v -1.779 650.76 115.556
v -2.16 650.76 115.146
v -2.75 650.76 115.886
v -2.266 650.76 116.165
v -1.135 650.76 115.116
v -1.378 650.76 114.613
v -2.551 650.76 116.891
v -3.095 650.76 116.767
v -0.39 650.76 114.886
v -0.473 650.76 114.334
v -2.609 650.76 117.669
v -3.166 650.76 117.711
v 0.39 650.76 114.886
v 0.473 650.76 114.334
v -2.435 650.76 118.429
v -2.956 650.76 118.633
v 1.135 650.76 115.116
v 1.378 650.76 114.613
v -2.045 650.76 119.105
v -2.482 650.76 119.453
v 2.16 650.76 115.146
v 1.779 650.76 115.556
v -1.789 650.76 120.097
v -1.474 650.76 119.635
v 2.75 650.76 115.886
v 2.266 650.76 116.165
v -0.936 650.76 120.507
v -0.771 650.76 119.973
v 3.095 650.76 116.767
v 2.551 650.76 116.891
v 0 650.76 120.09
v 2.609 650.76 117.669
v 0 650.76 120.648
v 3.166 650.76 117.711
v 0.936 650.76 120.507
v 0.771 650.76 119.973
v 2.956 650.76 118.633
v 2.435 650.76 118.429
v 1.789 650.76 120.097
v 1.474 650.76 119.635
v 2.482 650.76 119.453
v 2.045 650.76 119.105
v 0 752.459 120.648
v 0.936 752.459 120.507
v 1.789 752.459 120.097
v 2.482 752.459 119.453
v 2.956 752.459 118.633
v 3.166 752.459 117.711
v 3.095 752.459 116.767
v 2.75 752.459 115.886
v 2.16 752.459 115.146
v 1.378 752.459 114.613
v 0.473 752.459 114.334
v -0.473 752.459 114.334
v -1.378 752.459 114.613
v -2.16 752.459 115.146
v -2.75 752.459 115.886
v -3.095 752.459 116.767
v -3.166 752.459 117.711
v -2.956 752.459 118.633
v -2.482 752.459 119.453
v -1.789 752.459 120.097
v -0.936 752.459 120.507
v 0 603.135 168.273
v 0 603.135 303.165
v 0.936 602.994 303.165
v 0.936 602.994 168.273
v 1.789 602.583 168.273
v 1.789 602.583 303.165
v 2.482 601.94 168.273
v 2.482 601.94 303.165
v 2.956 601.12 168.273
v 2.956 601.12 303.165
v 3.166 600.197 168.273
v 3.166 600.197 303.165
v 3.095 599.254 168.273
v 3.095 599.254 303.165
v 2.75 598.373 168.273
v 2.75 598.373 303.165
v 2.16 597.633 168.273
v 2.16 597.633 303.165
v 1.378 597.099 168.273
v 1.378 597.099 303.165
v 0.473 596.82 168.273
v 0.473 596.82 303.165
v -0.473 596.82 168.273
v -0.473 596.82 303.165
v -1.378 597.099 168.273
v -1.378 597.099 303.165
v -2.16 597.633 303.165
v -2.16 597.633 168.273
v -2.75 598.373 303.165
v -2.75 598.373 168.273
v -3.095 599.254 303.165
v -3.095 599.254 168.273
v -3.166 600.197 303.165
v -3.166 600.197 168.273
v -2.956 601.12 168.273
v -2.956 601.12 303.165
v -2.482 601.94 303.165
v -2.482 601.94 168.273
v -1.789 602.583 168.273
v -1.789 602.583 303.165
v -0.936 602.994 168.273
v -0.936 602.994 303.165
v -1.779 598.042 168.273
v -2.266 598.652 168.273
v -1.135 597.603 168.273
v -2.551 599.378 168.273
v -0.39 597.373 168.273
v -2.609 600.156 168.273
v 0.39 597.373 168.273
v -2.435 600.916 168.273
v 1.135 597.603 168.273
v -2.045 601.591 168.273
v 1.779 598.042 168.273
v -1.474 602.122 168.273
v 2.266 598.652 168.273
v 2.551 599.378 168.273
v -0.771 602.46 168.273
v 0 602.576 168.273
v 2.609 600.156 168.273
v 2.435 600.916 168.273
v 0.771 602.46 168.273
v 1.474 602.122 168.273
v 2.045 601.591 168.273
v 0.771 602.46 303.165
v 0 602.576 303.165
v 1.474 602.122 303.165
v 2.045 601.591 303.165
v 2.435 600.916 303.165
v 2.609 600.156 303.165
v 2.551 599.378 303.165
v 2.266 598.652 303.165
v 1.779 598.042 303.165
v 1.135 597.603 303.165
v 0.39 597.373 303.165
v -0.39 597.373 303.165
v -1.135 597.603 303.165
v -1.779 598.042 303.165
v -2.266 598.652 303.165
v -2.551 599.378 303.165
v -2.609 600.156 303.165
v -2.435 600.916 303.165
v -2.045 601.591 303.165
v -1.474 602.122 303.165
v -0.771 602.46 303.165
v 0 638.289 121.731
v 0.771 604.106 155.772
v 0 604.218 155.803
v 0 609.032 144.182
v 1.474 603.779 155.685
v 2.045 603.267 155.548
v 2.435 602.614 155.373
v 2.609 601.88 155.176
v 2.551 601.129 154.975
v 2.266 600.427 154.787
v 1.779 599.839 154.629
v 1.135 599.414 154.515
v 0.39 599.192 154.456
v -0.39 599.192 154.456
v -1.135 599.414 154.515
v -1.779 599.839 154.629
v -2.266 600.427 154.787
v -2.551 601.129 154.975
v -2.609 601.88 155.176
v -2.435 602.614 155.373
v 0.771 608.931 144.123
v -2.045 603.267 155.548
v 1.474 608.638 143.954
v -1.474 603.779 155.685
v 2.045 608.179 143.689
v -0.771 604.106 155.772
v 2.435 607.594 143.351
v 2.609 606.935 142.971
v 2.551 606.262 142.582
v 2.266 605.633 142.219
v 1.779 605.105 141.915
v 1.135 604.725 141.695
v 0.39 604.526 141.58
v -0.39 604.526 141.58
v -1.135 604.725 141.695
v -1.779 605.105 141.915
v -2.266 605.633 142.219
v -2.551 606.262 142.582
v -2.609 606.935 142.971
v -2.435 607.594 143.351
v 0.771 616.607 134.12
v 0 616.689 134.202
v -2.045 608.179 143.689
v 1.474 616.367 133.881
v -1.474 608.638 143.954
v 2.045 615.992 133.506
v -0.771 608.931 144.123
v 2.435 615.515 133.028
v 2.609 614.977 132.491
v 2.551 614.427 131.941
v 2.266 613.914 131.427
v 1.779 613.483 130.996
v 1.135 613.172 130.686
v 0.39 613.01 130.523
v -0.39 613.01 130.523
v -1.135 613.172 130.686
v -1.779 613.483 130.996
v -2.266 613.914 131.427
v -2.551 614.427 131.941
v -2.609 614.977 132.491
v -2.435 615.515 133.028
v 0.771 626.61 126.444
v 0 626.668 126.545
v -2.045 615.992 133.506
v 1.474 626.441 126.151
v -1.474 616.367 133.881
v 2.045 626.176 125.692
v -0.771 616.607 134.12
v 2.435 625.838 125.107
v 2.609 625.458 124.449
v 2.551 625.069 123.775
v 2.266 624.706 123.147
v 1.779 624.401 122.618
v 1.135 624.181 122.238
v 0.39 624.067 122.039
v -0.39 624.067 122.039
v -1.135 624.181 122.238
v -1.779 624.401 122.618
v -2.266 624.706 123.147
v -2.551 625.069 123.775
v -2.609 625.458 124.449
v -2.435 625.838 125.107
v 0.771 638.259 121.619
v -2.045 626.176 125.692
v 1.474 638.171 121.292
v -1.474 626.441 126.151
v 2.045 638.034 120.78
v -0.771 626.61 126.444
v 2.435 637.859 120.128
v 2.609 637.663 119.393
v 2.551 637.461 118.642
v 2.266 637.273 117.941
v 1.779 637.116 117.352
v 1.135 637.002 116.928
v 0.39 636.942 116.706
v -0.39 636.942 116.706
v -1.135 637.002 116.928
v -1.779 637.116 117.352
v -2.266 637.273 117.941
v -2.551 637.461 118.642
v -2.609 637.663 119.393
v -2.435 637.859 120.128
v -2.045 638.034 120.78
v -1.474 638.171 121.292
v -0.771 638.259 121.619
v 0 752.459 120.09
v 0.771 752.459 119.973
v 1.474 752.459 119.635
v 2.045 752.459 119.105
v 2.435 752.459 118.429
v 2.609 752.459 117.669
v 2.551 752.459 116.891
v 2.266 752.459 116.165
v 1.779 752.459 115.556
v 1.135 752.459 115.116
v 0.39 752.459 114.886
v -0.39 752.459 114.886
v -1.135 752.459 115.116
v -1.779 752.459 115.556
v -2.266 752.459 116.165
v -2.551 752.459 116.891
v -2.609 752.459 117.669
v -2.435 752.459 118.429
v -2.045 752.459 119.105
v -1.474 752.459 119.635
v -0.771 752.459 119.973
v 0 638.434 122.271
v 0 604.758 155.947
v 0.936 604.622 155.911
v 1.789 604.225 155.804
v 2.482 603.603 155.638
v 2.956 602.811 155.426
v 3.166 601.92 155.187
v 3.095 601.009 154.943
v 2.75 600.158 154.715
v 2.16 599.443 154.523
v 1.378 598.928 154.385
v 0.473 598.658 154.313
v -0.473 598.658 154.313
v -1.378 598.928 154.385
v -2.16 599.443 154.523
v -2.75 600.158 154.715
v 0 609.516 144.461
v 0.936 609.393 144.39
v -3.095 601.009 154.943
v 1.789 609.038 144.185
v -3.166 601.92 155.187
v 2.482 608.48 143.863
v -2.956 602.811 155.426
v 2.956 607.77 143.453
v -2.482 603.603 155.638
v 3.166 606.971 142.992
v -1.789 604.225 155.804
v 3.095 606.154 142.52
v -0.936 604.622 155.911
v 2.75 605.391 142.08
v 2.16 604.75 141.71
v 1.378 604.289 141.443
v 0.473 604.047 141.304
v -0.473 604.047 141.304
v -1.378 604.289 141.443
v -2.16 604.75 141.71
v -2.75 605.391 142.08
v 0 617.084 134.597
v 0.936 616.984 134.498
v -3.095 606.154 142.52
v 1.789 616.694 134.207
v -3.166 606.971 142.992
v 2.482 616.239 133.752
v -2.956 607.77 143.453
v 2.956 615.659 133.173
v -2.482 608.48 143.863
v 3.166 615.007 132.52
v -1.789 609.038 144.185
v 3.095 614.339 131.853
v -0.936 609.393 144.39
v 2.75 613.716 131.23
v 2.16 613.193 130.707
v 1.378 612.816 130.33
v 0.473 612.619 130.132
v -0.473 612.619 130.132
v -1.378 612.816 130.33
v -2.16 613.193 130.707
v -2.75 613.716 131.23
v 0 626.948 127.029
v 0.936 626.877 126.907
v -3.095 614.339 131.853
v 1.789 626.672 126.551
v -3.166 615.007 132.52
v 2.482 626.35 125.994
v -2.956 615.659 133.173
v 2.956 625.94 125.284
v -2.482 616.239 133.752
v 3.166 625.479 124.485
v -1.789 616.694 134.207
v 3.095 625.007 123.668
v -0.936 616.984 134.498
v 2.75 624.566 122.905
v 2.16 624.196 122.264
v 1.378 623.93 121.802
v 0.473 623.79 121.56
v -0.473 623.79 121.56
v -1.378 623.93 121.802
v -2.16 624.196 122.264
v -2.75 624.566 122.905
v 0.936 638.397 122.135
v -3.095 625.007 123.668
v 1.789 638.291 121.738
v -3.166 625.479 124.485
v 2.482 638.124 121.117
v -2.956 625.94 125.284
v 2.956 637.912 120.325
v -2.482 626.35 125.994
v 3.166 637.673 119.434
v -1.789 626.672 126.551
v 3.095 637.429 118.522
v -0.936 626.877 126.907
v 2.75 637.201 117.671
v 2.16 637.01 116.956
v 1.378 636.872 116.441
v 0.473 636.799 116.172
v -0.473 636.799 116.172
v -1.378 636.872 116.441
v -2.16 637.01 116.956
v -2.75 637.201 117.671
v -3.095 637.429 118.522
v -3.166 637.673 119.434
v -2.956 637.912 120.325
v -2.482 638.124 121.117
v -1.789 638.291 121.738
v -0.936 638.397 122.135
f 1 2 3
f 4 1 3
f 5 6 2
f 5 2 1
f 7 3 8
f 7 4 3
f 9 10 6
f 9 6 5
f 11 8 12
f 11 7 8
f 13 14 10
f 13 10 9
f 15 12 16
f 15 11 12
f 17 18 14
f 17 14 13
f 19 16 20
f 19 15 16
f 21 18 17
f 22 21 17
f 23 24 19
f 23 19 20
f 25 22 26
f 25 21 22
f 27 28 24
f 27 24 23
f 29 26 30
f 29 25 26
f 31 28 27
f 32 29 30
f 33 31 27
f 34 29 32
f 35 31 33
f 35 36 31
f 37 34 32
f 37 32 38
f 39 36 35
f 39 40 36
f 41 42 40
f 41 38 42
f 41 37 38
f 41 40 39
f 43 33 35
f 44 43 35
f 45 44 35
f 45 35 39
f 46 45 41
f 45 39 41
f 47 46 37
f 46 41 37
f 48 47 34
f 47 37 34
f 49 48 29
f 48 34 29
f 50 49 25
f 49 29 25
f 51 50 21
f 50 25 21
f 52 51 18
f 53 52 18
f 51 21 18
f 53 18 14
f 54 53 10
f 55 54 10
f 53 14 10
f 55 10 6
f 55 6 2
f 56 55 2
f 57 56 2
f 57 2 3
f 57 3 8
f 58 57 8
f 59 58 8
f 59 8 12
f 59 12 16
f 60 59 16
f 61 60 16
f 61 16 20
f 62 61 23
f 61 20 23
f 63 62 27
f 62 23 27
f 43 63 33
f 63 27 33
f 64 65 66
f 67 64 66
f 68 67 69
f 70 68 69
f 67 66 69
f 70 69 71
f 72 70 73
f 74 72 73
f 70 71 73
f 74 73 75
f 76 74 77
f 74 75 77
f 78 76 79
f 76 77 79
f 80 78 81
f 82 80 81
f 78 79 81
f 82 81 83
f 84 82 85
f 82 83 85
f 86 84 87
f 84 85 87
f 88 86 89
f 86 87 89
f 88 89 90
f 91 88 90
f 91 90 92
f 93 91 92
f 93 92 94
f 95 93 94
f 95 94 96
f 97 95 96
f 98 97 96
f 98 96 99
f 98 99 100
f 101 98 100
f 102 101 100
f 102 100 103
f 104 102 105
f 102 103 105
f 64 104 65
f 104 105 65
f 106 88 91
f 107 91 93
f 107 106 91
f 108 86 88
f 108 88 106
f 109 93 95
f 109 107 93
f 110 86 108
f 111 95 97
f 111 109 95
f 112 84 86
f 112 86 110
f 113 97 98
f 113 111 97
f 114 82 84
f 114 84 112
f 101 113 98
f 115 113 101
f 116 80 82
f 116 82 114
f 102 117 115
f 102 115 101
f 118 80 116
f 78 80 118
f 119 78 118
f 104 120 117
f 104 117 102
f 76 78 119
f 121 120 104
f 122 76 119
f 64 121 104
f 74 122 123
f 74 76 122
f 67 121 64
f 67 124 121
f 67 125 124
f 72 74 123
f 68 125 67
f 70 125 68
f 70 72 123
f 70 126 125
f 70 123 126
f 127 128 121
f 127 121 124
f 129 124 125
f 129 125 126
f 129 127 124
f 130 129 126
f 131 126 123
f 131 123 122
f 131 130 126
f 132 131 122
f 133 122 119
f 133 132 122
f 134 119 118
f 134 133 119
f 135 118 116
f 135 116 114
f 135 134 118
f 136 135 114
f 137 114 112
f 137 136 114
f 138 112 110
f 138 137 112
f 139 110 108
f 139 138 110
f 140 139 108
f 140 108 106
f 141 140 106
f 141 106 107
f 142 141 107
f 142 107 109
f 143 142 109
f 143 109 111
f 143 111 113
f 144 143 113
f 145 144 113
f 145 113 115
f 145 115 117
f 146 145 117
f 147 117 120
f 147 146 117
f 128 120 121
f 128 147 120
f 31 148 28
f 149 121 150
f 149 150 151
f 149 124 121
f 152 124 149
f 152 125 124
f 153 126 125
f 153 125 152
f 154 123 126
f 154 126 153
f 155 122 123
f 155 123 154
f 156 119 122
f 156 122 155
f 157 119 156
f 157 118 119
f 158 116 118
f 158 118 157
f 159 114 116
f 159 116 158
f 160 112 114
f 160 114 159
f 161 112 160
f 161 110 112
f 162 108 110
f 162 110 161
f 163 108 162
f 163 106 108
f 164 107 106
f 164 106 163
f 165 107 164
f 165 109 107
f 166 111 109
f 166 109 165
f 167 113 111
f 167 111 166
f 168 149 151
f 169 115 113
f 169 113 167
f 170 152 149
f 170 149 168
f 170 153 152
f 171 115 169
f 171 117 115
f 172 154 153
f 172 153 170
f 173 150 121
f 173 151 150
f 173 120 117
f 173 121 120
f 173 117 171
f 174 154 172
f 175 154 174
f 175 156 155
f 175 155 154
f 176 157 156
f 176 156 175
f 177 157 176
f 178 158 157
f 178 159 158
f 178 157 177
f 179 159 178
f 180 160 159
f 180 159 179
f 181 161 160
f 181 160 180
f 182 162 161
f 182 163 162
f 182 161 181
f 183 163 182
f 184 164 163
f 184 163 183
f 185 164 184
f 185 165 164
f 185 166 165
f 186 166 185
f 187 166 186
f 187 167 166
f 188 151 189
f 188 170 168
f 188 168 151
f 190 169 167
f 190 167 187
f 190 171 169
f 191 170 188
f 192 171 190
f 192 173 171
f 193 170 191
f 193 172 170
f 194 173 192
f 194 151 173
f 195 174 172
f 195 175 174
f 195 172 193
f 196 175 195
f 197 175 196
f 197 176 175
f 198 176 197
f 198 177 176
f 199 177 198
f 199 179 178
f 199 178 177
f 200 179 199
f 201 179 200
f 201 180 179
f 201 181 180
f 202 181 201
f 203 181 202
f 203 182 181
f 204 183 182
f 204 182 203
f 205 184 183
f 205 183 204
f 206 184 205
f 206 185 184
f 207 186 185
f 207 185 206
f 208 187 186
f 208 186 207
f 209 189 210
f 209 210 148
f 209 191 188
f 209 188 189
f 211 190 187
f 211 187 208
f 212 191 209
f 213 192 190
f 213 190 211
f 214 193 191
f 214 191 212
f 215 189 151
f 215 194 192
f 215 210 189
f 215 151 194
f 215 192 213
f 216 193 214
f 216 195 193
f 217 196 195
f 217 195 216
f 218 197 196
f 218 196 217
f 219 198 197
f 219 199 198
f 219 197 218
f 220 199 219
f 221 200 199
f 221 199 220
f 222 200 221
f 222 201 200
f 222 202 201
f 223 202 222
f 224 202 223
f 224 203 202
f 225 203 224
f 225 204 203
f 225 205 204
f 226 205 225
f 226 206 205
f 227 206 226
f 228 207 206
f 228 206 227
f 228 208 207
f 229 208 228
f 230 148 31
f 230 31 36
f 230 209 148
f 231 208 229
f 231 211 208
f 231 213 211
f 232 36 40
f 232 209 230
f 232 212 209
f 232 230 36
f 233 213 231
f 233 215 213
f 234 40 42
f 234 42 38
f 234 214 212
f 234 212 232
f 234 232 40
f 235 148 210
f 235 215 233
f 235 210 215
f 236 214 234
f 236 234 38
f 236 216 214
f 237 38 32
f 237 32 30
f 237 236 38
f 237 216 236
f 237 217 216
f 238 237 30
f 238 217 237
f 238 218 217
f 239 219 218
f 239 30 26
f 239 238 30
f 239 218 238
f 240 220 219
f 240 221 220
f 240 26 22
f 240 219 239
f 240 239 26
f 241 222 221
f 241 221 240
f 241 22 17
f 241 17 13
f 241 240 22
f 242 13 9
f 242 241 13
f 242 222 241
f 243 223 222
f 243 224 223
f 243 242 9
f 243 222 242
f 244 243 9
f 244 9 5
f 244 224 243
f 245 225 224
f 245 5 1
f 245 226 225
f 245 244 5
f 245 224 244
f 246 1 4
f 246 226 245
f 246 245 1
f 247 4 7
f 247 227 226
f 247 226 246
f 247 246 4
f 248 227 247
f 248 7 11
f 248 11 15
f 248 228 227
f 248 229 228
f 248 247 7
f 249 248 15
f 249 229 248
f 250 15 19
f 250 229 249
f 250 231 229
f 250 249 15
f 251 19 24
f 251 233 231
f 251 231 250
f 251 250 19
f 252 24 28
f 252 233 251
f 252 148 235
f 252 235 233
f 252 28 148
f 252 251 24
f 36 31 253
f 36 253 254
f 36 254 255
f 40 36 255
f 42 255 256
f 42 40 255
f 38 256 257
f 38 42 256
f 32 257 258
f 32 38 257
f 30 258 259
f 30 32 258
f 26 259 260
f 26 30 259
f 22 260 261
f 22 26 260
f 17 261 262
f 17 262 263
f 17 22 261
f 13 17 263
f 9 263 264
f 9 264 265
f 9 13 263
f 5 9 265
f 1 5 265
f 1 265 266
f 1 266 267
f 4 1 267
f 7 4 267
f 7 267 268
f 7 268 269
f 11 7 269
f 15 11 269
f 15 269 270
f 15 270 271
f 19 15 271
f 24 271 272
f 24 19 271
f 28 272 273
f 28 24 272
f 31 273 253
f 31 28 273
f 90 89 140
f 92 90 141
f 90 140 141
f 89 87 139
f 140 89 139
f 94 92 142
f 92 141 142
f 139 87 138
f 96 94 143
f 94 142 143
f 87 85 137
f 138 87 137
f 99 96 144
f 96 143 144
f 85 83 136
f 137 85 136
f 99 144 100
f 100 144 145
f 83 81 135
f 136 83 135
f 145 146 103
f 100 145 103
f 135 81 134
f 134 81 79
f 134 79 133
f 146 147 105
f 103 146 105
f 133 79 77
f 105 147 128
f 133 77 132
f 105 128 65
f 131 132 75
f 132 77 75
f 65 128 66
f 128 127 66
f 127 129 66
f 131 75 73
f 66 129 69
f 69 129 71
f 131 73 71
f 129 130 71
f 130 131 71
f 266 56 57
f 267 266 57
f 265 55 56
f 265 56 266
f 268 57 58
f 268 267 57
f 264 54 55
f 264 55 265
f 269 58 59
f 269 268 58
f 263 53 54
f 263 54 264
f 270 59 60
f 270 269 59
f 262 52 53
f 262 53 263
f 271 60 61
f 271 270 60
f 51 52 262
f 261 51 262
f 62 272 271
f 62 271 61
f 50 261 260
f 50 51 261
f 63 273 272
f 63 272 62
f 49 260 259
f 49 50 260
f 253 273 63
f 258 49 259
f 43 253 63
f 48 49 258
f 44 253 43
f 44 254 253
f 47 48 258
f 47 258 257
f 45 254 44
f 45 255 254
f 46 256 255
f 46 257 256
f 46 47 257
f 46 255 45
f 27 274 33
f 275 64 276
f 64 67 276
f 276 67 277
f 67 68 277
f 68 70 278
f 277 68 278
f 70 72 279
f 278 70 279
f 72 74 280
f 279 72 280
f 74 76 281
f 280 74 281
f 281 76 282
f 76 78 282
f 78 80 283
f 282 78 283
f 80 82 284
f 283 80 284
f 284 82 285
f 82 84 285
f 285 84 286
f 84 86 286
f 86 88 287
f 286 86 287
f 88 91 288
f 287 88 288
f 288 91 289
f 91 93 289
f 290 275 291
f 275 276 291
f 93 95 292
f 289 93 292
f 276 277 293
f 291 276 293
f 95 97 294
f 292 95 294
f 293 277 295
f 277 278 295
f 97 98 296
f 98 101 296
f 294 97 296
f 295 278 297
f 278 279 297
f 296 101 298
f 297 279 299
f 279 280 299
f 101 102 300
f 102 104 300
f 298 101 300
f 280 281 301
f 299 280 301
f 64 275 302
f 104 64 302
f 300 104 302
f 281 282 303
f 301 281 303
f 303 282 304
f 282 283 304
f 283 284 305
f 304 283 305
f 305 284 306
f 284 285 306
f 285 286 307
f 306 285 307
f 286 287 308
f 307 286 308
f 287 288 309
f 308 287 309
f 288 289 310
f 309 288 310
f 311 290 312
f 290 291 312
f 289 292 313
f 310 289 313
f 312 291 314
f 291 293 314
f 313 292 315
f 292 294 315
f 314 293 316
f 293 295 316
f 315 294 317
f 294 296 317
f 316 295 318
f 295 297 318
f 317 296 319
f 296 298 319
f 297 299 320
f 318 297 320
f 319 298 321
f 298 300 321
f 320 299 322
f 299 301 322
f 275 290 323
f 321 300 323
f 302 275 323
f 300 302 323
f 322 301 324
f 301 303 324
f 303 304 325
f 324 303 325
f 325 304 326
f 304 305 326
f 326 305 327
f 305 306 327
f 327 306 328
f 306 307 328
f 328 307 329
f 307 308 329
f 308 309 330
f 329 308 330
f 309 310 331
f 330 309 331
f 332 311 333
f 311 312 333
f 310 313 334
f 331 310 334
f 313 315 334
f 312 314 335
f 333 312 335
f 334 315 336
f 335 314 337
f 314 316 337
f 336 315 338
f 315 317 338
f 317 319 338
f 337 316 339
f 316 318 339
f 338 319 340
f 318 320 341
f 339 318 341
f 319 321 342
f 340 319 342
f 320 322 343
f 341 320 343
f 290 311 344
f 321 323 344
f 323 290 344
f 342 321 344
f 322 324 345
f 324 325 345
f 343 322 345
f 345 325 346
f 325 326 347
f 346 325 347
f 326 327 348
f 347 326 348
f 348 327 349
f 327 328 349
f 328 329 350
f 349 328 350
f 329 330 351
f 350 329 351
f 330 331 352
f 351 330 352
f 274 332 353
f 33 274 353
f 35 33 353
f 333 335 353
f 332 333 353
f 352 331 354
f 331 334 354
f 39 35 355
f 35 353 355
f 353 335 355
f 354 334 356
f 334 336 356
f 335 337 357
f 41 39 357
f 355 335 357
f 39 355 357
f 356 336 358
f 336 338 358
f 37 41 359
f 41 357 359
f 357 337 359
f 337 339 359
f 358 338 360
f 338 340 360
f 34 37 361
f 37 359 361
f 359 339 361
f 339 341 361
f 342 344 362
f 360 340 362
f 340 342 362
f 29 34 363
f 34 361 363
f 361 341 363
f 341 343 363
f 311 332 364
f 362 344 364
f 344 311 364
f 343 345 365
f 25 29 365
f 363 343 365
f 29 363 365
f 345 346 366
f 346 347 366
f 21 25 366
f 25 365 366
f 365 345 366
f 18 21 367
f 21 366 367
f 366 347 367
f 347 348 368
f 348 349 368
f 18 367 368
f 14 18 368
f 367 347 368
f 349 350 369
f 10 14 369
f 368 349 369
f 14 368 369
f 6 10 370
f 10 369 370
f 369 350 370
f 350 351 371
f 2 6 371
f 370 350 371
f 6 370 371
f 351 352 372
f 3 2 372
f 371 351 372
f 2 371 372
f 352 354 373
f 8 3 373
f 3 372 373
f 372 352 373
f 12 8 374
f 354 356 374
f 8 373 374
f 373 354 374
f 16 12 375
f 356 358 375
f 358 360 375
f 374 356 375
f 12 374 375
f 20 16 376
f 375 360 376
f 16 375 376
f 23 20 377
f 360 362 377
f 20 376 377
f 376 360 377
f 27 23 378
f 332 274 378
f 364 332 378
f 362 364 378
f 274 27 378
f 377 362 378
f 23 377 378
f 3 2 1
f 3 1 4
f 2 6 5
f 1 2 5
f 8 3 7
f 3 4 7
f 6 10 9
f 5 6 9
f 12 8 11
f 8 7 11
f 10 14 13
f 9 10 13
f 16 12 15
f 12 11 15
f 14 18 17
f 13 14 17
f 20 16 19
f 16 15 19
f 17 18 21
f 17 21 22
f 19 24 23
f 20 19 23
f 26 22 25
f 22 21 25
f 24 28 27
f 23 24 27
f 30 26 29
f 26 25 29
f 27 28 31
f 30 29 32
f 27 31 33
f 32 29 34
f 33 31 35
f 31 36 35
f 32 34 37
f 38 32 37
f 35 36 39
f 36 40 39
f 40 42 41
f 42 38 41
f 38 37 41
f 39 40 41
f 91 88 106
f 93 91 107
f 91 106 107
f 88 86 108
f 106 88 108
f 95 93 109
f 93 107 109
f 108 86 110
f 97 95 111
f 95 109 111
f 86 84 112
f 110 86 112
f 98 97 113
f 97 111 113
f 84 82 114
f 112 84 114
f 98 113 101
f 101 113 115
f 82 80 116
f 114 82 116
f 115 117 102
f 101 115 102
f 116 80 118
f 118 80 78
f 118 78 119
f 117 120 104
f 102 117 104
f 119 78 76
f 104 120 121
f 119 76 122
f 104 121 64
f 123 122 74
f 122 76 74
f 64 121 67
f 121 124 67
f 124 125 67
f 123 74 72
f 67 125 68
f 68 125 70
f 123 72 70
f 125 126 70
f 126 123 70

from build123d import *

# Parameters (mm, degrees)
SKETCH11_R                = 3.175
SKETCH11_R_2              = 2.6162
PIPE_0_5_SCH_40_1_DEPTH   = 134.891141117
SKETCH11_ON_SEGMENT_2_R   = 3.175
SKETCH11_ON_SEGMENT_2_R_2 = 2.6162
PIPE_0_5_SCH_40_1_2_ANGLE = 90
SKETCH11_ON_SEGMENT_3_R   = 3.175
SKETCH11_ON_SEGMENT_3_R_2 = 2.6162
PIPE_0_5_SCH_40_1_3_DEPTH = 101.698598989


with BuildPart() as part:
    # Sketch11 → Pipe 0.5 SCH 40(1) (new body)
    with BuildSketch(Plane(origin=(0, 599.960019272, 303.164595711), x_dir=(0, 1, 0), z_dir=(0, 0, -1))):
        Circle(SKETCH11_R)
        Circle(SKETCH11_R_2, mode=Mode.SUBTRACT)
    extrude(amount=PIPE_0_5_SCH_40_1_DEPTH)


with BuildPart() as body_2:
    # Sketch11 on segment 2 (carried to the start of arc 2) → Pipe 0.5 SCH 40_1 2 (revolve)
    with BuildSketch(Plane(origin=(0, 599.960019272, 168.273454594), x_dir=(0, 1, 0), z_dir=(0, 0, -1))):
        Circle(SKETCH11_ON_SEGMENT_2_R)
        Circle(SKETCH11_ON_SEGMENT_2_R_2, mode=Mode.SUBTRACT)
    revolve(axis=Axis((0, 650.760019272, 168.273454594), (1, 0, 0)), revolution_arc=PIPE_0_5_SCH_40_1_2_ANGLE)


with BuildPart() as body_3:
    # Sketch11 on segment 3 (carried to segment 3) → Pipe 0.5 SCH 40_1 3 (new body)
    with BuildSketch(Plane(origin=(0, 650.760019272, 117.473454594), x_dir=(0, 0, 1), z_dir=(0, 1, 0))):
        Circle(SKETCH11_ON_SEGMENT_3_R)
        Circle(SKETCH11_ON_SEGMENT_3_R_2, mode=Mode.SUBTRACT)
    extrude(amount=PIPE_0_5_SCH_40_1_3_DEPTH)


solid = Compound([part.part, body_2.part, body_3.part])
